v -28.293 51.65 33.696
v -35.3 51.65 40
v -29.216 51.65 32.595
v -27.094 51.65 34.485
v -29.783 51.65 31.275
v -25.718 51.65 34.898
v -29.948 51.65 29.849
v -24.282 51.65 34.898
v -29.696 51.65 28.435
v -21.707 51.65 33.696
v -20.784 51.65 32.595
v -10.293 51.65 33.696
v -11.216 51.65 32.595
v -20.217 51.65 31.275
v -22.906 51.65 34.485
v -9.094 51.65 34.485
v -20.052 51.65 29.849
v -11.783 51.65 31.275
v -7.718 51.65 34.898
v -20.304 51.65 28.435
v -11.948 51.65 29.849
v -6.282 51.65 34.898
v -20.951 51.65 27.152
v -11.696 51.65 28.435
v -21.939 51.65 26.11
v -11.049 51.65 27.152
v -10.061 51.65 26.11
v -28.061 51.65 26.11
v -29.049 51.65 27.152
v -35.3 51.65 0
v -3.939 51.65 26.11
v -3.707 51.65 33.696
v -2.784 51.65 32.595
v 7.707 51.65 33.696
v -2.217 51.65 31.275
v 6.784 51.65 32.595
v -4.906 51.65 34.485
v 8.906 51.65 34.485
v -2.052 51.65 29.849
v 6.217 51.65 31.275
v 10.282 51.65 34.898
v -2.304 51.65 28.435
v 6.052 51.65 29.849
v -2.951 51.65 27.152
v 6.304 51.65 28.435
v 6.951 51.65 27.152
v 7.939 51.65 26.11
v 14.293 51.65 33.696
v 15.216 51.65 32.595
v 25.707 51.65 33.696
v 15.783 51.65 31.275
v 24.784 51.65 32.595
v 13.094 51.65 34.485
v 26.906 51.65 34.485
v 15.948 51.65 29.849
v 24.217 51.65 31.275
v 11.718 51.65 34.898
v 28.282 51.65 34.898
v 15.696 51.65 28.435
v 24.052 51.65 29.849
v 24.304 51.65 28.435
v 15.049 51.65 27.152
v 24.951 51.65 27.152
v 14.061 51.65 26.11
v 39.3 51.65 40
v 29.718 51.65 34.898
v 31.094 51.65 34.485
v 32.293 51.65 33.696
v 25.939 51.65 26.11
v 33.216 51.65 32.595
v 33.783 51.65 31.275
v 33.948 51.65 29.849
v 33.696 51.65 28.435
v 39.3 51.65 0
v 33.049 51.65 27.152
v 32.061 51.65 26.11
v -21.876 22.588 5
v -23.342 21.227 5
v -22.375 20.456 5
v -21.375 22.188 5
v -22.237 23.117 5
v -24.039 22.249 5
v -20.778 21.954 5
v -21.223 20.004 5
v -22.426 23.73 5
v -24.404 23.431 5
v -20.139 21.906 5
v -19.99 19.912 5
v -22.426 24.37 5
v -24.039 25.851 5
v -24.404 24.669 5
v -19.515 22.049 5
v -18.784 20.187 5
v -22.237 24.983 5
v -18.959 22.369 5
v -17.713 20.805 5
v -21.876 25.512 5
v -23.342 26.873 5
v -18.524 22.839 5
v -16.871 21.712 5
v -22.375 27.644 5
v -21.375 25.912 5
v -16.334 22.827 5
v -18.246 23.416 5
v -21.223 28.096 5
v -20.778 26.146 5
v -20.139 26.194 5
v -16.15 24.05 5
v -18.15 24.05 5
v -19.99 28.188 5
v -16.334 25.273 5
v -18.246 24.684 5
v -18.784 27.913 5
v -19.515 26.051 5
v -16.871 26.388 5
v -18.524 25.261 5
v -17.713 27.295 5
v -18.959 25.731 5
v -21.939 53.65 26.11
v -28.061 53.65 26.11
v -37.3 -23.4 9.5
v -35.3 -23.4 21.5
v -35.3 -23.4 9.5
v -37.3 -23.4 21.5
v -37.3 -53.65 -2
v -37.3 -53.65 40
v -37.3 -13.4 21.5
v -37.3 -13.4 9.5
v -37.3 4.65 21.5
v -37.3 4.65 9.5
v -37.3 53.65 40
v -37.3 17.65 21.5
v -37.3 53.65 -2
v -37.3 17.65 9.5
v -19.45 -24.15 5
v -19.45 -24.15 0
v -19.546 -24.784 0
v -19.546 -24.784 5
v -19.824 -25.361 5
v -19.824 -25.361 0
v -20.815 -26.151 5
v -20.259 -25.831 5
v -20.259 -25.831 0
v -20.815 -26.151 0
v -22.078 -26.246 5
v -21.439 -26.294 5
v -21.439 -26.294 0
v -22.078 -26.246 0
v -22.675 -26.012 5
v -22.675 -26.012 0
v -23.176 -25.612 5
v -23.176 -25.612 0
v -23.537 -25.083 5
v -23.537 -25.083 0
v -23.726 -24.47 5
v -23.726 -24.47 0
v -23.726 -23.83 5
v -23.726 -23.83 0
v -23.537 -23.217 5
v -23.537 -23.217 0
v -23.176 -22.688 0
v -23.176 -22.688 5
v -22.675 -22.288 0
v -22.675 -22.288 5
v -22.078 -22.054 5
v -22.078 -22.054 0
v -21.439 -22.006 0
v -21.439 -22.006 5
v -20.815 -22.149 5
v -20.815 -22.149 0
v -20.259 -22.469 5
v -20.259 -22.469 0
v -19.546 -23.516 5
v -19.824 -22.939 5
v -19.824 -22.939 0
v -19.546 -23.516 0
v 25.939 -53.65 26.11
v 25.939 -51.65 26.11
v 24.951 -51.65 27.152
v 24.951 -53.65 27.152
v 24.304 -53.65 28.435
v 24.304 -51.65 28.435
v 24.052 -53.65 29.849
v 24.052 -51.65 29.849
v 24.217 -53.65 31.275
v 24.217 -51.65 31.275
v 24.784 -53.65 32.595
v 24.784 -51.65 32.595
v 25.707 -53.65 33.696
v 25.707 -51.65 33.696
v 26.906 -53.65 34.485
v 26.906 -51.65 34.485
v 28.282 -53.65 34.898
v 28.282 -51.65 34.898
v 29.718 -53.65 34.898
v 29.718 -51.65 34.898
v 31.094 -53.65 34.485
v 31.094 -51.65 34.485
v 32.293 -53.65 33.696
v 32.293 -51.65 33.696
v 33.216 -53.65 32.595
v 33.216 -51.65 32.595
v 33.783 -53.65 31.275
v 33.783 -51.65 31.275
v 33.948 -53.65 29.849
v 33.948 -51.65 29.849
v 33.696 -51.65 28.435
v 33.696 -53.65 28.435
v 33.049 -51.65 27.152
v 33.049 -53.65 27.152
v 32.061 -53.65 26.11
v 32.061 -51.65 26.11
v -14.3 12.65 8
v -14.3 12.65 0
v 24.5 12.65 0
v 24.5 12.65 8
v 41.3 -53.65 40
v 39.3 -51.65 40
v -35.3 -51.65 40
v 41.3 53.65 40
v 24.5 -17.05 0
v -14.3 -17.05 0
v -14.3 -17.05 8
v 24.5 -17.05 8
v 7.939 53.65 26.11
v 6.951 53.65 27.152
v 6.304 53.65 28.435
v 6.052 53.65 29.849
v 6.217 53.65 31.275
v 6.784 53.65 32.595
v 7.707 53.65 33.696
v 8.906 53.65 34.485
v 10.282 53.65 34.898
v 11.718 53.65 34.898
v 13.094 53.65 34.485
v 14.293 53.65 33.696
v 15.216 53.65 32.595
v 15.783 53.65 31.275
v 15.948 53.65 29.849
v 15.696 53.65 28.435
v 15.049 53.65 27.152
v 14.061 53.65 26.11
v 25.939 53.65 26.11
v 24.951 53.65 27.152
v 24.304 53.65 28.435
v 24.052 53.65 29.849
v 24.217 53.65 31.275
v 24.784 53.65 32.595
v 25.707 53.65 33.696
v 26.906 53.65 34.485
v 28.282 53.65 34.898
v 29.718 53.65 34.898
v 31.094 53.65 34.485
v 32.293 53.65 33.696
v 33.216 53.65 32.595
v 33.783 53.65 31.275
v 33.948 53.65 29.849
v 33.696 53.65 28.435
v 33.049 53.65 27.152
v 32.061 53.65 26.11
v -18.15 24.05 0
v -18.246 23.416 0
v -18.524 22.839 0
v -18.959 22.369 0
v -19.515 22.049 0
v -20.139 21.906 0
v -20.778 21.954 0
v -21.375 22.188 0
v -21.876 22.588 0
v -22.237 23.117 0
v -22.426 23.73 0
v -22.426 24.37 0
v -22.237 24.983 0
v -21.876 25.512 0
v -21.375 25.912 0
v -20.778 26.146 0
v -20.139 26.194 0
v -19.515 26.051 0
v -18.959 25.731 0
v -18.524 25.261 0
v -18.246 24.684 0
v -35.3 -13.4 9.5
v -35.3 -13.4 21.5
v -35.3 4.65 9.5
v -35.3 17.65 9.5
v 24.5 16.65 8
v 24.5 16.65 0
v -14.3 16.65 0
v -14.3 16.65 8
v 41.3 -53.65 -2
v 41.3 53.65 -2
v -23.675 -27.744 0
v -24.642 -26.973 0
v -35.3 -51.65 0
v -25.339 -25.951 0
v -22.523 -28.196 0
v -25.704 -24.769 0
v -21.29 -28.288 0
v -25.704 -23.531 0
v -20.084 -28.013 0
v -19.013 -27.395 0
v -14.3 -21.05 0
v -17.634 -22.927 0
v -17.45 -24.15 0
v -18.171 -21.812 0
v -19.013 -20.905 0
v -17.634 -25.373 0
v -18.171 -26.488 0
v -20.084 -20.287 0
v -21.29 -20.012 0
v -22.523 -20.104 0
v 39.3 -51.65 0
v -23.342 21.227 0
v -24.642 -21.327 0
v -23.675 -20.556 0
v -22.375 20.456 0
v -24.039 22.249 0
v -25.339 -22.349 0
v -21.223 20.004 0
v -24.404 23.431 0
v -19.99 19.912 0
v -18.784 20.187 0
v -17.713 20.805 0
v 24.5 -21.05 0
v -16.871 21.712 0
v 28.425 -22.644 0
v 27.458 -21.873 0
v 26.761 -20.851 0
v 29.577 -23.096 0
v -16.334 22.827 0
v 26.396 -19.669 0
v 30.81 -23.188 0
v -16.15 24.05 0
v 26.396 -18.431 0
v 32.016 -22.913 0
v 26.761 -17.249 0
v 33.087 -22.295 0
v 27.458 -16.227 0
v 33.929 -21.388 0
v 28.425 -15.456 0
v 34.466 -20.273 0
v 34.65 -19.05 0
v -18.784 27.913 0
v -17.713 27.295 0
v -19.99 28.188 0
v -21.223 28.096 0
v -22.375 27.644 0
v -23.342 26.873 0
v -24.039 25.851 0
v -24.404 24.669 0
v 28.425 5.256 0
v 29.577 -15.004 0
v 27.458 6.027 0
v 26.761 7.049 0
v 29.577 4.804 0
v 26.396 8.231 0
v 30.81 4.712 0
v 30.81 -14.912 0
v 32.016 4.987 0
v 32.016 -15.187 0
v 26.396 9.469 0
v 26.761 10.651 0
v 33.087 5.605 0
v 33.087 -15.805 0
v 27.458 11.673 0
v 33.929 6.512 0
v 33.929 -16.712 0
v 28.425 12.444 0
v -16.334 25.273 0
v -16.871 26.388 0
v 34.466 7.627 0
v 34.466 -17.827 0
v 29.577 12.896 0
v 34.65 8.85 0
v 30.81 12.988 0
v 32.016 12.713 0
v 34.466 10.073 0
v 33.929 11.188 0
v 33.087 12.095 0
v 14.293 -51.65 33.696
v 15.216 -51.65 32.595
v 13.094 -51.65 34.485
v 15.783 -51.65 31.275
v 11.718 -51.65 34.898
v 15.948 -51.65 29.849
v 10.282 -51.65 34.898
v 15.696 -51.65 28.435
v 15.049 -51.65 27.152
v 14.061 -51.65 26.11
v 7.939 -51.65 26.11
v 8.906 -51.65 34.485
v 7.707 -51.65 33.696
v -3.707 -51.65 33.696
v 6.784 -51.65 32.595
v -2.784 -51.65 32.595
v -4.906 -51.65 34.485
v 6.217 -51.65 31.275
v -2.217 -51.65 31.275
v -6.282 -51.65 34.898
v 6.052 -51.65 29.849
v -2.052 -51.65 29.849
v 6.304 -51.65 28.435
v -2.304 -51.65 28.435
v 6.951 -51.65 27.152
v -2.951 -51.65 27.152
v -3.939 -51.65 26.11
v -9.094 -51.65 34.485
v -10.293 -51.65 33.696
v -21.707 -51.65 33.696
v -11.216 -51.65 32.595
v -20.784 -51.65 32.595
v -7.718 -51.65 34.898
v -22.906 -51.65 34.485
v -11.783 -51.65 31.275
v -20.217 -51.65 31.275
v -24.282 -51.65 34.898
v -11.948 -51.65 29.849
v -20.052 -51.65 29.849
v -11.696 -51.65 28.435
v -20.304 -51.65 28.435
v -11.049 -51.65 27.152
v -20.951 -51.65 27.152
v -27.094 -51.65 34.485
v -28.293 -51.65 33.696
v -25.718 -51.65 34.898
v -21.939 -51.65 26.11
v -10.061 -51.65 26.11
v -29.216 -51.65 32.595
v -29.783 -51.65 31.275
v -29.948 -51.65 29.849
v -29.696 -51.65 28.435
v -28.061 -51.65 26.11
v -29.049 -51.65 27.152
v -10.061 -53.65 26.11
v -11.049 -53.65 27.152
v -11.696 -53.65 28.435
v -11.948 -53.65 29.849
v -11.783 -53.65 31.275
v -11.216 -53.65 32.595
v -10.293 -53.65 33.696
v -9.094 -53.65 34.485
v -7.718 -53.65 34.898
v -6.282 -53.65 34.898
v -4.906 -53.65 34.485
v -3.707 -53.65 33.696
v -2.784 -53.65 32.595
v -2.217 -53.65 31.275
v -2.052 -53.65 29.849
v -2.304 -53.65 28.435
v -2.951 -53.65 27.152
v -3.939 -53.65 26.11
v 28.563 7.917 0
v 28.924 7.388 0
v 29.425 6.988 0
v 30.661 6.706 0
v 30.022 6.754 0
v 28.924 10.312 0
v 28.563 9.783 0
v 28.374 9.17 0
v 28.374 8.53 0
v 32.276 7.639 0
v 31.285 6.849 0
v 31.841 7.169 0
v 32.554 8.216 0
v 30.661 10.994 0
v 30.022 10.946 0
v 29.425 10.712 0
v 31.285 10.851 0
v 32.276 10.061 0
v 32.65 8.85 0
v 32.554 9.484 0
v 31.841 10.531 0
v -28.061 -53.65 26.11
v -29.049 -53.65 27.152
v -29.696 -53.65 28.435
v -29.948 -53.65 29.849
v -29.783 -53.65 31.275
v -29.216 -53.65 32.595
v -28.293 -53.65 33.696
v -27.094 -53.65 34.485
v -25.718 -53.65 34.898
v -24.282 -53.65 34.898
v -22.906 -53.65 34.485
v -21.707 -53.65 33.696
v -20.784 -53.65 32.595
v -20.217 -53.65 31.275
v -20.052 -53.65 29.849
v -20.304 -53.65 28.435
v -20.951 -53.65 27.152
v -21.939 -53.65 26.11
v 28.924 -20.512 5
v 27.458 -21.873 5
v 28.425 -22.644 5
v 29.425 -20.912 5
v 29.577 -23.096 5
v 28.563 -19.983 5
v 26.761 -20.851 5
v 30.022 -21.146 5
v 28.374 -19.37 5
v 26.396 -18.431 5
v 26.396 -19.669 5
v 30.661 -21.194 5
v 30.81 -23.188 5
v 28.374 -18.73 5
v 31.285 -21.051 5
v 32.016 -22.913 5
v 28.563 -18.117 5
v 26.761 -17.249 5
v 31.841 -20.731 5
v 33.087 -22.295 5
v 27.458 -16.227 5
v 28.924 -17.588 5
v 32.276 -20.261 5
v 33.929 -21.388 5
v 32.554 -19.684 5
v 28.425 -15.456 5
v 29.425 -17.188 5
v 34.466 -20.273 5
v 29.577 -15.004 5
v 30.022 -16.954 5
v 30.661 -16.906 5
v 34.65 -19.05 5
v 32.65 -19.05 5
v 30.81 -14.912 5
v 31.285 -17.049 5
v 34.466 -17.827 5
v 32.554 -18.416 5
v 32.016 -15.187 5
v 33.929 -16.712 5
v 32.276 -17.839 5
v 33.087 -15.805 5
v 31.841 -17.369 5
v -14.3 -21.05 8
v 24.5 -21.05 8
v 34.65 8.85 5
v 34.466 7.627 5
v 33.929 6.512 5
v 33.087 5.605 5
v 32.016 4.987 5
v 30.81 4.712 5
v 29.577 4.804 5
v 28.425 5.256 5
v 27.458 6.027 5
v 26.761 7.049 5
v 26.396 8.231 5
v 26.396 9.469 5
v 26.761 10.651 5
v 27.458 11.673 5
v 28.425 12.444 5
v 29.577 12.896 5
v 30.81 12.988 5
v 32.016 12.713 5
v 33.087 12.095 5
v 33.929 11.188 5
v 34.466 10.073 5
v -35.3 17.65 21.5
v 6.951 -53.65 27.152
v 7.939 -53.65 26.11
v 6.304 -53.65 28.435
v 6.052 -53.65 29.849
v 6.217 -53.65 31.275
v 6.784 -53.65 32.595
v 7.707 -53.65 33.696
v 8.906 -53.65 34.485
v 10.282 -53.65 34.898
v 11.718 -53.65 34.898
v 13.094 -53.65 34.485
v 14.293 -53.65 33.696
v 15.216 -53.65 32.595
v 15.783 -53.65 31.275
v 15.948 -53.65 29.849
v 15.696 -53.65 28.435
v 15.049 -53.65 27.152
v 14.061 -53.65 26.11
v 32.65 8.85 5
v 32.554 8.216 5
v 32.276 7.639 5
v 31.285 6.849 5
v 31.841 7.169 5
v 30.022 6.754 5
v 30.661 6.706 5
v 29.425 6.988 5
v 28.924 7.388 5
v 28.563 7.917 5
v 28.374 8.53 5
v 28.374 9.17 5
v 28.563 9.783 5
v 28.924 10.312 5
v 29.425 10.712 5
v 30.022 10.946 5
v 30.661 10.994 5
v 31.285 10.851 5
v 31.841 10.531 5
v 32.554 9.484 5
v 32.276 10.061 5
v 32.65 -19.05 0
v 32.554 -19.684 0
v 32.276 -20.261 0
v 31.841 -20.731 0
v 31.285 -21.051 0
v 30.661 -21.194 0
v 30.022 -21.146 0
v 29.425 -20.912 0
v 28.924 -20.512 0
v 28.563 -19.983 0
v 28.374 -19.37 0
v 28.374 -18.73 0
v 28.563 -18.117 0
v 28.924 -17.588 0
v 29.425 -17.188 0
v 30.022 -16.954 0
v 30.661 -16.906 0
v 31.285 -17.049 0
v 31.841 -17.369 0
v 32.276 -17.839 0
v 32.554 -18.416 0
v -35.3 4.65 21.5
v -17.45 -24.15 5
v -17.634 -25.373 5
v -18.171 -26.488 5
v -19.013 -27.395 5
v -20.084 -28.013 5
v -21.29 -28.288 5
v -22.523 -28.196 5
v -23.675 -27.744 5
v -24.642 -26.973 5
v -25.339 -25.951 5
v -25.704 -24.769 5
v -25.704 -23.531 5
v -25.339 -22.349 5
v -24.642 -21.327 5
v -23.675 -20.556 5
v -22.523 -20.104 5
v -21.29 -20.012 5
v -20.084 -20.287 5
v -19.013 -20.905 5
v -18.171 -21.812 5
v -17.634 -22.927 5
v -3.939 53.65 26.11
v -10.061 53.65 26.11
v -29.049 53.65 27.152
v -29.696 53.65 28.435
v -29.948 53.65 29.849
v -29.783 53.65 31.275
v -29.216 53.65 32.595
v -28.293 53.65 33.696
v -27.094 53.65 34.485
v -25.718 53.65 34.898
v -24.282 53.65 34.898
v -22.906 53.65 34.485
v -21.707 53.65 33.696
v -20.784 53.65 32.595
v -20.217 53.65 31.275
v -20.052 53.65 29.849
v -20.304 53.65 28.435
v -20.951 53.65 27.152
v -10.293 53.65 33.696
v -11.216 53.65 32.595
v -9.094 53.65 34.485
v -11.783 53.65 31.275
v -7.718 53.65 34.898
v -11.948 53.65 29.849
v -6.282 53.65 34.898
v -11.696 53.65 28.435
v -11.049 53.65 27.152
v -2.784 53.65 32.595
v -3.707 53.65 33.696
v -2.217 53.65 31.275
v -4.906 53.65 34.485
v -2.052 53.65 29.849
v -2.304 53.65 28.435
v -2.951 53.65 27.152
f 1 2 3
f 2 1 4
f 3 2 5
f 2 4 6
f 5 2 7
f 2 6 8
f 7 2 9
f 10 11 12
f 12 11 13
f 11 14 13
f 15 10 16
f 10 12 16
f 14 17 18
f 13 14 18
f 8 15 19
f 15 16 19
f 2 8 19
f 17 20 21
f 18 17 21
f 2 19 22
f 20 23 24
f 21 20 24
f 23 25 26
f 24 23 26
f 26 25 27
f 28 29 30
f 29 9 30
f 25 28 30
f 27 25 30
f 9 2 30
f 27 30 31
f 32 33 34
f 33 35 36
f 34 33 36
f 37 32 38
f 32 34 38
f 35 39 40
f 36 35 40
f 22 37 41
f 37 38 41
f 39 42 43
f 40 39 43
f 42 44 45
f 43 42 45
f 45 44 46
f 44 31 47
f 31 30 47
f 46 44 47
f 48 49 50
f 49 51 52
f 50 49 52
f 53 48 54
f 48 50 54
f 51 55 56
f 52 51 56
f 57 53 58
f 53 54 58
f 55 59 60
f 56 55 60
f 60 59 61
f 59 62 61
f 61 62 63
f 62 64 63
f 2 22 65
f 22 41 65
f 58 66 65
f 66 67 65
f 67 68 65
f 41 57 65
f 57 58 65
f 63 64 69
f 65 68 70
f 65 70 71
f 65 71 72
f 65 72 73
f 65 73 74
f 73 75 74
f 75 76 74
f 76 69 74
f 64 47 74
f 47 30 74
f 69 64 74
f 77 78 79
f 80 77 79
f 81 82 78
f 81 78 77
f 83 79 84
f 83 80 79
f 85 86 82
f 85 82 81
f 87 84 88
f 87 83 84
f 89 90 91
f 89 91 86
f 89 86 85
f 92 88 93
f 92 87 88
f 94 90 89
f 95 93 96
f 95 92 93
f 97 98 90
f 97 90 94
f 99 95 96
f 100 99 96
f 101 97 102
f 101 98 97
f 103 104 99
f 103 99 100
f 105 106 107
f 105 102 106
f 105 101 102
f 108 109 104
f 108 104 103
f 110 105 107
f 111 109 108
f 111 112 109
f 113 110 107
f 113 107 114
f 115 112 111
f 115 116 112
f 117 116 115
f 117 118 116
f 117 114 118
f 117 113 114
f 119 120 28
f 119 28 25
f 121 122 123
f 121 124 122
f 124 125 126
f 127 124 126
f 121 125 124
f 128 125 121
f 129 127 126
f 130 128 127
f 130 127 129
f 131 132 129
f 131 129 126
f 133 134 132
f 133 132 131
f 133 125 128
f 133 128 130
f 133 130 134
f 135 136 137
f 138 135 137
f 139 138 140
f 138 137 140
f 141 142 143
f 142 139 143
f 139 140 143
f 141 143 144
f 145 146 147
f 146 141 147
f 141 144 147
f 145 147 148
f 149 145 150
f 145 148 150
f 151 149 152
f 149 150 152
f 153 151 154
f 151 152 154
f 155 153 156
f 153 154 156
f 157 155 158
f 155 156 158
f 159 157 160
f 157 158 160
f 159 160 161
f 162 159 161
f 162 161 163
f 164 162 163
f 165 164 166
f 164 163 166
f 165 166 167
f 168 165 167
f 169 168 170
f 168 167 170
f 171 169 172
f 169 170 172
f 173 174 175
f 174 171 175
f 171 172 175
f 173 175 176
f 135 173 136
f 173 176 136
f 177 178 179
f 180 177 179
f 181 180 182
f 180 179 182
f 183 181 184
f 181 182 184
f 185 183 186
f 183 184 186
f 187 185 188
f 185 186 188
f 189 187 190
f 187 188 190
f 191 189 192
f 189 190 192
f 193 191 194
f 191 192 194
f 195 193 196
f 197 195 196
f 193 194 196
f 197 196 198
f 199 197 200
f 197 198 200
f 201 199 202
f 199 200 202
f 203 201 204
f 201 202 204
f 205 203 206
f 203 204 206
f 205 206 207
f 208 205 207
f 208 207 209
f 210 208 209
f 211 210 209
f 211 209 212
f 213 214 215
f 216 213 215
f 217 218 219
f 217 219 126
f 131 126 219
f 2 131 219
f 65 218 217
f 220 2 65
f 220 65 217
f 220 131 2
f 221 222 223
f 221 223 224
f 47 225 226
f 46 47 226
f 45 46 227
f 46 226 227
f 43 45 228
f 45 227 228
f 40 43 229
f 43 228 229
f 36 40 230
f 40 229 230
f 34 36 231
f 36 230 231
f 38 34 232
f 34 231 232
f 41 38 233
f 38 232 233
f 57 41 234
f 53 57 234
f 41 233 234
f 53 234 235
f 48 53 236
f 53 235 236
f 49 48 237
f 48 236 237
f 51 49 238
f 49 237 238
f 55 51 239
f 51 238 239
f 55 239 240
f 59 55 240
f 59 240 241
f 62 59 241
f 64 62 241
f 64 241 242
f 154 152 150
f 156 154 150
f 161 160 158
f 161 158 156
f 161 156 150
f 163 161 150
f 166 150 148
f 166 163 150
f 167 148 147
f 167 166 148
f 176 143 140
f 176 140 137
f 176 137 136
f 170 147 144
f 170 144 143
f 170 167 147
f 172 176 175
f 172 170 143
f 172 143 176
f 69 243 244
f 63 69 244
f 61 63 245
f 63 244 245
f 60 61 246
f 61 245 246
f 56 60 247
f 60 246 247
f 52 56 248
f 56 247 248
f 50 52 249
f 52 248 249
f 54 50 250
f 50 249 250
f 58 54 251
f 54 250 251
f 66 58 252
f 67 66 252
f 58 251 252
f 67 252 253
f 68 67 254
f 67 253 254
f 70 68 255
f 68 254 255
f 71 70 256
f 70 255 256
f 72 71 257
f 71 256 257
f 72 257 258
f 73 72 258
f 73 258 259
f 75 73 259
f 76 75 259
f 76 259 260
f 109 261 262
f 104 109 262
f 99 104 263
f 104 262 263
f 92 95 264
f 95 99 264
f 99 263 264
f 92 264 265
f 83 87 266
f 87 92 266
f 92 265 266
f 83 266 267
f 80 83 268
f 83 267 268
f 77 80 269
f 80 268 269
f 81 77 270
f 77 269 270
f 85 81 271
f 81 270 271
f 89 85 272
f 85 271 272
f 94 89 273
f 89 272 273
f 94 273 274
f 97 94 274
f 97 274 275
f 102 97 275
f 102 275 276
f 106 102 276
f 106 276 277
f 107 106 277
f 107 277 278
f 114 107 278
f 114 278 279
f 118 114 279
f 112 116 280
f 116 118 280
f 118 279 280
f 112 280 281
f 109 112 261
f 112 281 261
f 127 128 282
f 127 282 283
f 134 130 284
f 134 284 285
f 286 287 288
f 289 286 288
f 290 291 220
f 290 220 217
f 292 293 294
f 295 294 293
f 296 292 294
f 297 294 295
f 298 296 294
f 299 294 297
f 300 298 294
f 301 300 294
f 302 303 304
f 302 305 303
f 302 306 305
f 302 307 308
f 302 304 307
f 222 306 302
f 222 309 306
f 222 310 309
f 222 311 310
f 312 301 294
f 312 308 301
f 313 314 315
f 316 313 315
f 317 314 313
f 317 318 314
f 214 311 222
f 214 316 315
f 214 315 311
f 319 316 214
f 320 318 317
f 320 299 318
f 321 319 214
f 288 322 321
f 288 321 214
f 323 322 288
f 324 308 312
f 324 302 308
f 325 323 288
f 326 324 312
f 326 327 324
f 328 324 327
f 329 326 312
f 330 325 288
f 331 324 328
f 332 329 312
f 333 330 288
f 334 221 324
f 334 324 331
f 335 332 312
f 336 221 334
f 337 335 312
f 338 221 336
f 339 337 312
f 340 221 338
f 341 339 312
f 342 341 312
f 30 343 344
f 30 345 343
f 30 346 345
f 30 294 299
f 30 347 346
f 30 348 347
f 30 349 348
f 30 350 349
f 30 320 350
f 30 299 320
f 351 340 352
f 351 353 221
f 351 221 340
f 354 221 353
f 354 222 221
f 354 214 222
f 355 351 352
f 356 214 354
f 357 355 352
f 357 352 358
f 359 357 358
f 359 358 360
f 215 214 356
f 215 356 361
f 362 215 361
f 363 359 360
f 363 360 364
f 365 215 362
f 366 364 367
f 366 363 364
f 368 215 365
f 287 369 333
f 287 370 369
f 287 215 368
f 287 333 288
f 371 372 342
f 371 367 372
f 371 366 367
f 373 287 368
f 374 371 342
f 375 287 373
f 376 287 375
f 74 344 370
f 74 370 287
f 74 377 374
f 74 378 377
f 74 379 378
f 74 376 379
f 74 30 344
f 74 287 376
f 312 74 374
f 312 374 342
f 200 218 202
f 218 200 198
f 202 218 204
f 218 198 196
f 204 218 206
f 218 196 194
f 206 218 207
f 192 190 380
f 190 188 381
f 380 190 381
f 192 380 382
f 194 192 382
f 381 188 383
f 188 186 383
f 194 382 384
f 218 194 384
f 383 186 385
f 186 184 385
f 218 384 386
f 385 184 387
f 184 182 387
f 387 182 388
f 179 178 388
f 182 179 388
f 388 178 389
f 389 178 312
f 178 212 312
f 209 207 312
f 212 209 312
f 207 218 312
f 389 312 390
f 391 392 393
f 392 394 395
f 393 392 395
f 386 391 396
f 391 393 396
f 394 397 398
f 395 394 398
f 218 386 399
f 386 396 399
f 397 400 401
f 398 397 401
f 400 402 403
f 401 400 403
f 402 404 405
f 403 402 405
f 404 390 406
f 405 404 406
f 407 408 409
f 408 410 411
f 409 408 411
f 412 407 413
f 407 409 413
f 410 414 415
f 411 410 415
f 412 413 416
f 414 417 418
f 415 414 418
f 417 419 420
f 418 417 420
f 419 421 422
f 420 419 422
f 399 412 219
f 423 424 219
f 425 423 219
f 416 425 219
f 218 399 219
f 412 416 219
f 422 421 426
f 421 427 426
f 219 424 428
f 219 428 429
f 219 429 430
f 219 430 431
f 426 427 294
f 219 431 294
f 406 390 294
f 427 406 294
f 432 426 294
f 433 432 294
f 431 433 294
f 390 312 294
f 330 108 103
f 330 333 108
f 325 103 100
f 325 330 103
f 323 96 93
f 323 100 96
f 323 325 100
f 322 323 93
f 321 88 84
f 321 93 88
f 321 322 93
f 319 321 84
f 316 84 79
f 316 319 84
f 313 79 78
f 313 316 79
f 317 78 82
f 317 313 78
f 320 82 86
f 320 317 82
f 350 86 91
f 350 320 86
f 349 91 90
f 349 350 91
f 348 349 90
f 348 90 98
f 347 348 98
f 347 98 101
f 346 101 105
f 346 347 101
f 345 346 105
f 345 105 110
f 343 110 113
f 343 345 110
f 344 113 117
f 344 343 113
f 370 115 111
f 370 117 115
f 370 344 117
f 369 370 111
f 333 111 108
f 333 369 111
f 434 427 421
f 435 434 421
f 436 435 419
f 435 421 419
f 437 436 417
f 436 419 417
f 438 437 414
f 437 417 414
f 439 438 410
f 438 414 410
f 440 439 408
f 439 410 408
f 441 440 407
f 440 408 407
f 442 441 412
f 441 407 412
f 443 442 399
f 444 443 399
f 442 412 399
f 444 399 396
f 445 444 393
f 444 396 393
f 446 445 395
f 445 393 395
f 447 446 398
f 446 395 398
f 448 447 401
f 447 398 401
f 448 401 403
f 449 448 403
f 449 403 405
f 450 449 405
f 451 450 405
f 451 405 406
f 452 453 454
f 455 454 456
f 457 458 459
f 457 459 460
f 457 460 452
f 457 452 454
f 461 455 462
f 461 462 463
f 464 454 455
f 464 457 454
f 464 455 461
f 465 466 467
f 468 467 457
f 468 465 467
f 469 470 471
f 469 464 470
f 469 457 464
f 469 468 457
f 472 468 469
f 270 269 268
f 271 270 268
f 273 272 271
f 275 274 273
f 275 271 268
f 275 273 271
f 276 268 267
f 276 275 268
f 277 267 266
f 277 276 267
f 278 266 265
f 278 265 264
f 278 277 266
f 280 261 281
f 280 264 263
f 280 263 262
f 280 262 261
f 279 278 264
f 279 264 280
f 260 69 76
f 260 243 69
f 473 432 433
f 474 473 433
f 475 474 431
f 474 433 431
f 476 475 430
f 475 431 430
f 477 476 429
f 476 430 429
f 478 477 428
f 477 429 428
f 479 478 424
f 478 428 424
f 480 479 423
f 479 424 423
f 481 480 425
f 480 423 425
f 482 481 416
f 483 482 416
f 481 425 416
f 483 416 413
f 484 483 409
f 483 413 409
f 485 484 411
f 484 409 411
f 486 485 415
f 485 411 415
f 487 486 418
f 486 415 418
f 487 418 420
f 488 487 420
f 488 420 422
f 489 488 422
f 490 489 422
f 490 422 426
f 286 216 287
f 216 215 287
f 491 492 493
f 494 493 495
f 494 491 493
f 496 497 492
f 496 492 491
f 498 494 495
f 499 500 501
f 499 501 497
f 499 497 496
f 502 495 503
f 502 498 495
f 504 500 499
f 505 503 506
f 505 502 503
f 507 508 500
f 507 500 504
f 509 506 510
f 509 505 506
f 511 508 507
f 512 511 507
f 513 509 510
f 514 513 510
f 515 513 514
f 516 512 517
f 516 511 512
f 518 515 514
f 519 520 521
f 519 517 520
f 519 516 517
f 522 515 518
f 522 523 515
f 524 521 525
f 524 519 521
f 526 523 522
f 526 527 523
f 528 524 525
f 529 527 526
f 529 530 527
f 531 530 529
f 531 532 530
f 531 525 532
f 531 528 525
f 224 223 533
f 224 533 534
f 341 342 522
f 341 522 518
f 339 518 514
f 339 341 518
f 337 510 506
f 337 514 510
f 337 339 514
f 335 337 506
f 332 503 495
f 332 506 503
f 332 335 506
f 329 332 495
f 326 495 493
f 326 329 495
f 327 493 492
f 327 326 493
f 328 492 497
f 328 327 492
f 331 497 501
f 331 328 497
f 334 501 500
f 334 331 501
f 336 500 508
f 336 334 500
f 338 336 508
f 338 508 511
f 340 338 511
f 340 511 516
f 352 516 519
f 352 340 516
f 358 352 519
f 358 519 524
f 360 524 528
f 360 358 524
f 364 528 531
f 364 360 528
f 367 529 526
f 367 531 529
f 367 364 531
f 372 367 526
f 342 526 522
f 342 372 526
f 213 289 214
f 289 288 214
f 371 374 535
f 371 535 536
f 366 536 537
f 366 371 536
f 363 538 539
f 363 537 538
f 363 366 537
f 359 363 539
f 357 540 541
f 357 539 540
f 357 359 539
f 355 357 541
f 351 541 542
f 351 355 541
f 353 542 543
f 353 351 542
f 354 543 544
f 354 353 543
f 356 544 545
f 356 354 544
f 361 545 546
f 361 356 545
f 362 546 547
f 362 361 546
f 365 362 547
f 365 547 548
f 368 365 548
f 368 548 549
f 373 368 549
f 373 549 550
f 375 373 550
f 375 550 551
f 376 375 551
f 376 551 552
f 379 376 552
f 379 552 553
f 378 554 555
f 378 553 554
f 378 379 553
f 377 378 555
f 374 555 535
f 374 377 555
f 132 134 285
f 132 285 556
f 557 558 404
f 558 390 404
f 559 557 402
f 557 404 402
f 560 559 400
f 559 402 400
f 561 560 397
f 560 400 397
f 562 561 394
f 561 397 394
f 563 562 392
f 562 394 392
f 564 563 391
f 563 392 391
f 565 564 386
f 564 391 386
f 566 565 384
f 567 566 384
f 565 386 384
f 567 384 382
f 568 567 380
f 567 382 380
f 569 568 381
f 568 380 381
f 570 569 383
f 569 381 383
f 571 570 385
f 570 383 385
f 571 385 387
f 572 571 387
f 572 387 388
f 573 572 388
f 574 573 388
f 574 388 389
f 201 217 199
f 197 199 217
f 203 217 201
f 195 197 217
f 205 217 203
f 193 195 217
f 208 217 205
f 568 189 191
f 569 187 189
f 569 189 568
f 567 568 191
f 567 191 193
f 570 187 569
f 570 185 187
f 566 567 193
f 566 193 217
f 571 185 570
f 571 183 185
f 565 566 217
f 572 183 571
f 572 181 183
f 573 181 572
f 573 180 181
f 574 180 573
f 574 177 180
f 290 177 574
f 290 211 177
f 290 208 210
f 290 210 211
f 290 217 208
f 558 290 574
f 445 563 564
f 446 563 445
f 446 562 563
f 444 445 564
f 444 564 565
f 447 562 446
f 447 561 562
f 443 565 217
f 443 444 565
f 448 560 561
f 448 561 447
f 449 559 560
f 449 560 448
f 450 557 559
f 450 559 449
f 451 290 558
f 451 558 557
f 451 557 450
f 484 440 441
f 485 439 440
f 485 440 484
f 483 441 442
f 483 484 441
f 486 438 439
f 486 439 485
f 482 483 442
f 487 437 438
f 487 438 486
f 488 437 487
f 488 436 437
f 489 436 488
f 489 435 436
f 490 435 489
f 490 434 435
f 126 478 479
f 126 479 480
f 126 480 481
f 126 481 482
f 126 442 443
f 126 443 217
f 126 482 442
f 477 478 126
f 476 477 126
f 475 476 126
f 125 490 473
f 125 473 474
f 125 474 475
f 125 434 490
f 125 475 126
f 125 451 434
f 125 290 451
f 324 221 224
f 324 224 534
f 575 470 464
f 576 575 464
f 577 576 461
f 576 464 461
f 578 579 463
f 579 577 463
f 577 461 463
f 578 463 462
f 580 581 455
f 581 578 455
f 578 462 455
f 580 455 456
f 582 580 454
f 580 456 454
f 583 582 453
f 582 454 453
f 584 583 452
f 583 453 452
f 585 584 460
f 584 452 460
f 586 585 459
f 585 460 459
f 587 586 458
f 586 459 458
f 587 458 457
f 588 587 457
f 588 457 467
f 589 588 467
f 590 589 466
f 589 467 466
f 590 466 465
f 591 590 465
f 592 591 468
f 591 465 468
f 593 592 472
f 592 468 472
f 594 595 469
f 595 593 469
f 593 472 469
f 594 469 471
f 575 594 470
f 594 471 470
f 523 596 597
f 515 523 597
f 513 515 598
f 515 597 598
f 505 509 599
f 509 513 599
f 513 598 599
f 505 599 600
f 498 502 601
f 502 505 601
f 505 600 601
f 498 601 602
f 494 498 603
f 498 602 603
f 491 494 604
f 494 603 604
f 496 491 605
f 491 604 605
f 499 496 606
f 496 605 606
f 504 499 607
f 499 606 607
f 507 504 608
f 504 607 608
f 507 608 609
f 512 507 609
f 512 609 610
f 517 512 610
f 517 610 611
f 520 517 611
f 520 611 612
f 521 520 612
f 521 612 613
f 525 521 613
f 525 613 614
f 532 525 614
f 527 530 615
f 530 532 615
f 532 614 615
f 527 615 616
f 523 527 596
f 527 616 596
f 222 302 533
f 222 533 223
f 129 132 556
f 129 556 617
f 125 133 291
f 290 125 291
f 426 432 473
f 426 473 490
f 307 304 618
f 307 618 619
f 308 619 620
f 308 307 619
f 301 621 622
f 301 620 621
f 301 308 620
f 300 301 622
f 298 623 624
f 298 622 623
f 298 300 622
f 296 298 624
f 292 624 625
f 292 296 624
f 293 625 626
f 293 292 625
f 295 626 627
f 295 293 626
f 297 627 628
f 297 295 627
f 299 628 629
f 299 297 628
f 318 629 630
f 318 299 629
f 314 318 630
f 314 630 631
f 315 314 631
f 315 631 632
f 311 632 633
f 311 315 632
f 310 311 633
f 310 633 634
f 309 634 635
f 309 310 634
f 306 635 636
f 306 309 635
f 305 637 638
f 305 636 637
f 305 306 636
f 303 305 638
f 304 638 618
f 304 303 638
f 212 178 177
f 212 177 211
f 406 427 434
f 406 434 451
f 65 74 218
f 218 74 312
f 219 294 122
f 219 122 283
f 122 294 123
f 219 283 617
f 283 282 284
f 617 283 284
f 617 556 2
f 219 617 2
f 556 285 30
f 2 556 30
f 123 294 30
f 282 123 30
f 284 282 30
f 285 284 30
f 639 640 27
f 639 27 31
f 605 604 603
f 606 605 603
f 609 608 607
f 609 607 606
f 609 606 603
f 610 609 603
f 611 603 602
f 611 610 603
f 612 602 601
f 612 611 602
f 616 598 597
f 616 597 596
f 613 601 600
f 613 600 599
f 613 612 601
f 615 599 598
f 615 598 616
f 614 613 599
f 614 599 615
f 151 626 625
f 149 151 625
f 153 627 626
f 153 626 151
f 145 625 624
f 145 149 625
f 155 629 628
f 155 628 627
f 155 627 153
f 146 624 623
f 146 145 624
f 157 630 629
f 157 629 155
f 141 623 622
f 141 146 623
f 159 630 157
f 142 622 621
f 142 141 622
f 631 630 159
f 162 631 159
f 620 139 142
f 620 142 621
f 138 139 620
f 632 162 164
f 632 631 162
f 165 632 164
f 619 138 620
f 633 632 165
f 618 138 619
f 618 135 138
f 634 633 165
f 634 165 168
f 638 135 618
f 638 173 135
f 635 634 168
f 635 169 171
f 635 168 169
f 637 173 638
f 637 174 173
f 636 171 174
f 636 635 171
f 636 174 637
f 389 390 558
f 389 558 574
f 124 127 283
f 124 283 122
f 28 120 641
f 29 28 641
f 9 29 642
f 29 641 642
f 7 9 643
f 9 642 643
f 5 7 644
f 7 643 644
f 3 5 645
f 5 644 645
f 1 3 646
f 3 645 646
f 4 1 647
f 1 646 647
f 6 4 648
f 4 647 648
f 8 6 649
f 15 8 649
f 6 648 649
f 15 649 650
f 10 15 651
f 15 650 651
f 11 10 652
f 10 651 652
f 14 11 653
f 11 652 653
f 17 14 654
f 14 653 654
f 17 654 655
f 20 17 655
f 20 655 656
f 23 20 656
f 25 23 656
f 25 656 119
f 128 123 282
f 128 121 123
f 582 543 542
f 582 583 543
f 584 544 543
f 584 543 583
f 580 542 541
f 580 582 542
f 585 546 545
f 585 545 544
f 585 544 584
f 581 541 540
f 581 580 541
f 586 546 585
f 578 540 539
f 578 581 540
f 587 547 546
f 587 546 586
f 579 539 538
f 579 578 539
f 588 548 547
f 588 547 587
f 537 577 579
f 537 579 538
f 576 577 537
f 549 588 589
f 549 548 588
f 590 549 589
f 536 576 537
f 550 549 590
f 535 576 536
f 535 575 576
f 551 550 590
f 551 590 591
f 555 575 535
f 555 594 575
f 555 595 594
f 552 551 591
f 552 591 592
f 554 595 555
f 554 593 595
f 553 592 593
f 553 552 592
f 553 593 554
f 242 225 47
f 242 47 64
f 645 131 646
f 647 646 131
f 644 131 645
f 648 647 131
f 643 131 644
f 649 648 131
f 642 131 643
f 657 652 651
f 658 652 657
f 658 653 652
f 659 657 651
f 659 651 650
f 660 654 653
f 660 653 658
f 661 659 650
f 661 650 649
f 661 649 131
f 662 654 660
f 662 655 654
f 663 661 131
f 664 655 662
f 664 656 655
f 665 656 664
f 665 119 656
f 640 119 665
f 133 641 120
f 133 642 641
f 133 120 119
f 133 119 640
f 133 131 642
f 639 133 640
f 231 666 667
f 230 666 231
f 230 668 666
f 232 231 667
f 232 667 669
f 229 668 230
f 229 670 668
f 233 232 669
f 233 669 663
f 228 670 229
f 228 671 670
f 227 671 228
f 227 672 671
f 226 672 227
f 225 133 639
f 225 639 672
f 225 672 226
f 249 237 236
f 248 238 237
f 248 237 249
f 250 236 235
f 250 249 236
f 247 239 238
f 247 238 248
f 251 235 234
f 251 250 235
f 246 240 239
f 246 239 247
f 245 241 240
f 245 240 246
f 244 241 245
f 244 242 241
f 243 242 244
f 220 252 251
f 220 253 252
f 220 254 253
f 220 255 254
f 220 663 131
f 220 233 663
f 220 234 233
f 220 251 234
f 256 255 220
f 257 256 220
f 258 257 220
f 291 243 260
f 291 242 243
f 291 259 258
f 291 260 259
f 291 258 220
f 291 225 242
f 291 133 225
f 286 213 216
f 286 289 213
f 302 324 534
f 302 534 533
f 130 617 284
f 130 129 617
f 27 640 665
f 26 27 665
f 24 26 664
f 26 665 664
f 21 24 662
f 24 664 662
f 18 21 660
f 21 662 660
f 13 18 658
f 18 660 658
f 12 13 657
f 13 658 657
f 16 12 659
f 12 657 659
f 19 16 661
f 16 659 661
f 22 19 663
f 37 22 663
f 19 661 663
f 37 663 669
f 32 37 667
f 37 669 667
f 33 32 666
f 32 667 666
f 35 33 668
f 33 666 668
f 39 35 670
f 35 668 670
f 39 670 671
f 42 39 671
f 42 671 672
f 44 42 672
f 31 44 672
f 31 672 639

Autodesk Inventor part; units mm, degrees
ref_plane "YZ Plane" through (0, 0, 0) normal (1, 0, 0) x (0, 1, 0)
ref_plane "XZ Plane" through (0, 0, 0) normal (0, 1, 0) x (-1, 0, 0)
ref_plane "XY Plane" through (0, 0, 0) normal (0, 0, 1) x (1, 0, 0)
sketch "Sketch1" plane through (0, 0, 0) normal (0, 0, 1) x (1, 0, 0)
  line L0 (-35.3, 51.65) -> (39.3, 51.65)
  line L1 (39.3, 51.65) -> (39.3, -51.65)
  line L2 (39.3, -51.65) -> (-35.3, -51.65)
  line L3 (-35.3, -51.65) -> (-35.3, 51.65)
  line L4 (-35.3, 51.65) -> (39.3, -51.65) construction
  line L5 (39.3, 51.65) -> (-35.3, -51.65) construction
  line L6 (34.3, 26.65) -> (-34.3, 26.65) construction
  line L7 (-34.3, 26.65) -> (-34.3, -26.65) construction
  line L8 (-34.3, -26.65) -> (34.3, -26.65) construction
  line L9 (34.3, -26.65) -> (34.3, 26.65) construction
  line L10 (34.3, 26.65) -> (-34.3, -26.65) construction
  line L11 (-34.3, 26.65) -> (34.3, -26.65) construction
  circle A0 centre (-20.3, 24.05) radius 1.6 construction
  circle A1 centre (-21.6, -24.15) radius 1.6 construction
  circle A2 centre (30.5, 8.85) radius 1.6 construction
  circle A3 centre (30.5, -19.05) radius 1.6 construction
  line L12 (-37.3, 53.65) -> (41.3, 53.65)
  line L13 (41.3, 53.65) -> (41.3, -53.65)
  line L14 (41.3, -53.65) -> (-37.3, -53.65)
  line L15 (-37.3, -53.65) -> (-37.3, 53.65)
  line L16 (-37.3, 53.65) -> (41.3, -53.65) construction
  line L17 (41.3, 53.65) -> (-37.3, -53.65) construction
  line L18 (30.5, 53.65) -> (30.5, -53.65) construction
  point P0 (0, 0)
  dimension "d0" = 53.3
  dimension "d2" = 68.6
  dimension "d3" = 14
  dimension "d4" = 2.5
  dimension "d5" = 50.8
  dimension "d6" = 27.9
  dimension "d7" = 5.1
  dimension "d8" = 3.2
  dimension "d9" = 25
  dimension "d10" = 1
  dimension "d11" = 2
  dimension "d12" = 2
  dimension "d59" = 5
  dimension "d62" = 25
  dimension "d63" = 2
  dimension "d64" = 2
  dimension "d92" = 15.2
  dimension "d94" = 1.3
extrude "Extrusion1" add sketch "Sketch1" against normal blind 2 contours L0 L1 L2 L3 | L12 L13 L14 L15
extrude "Extrusion2" add sketch "Sketch1" along normal blind 40
sketch "Sketch2" plane through (0, 0, 0) normal (0, 0, 1) x (1, 0, 0)
  circle A0 centre (-21.6, -24.15) radius 1.6 construction
  circle A1 centre (-20.3, 24.05) radius 4.15
  circle A2 centre (-21.6, -24.15) radius 4.15
  circle A3 centre (30.5, -19.05) radius 4.15
  circle A4 centre (30.5, 8.85) radius 4.15
  circle A5 centre (-20.3, 24.05) radius 2.15
  circle A6 centre (30.5, 8.85) radius 2.15
  circle A7 centre (-21.6, -24.15) radius 2.15
  circle A8 centre (30.5, -19.05) radius 2.15
  point P0 (0, 0)
  dimension "d17" = 8.3
  dimension "d19" = 4.3
extrude "Extrusion3" add sketch "Sketch2" along normal blind 5
sketch "Sketch6" plane through (-37.3, 53.65, -2) normal (0, 1, 0) x (1, 0, 0)
  line L0 (78.6, -42) -> (78.6, 0) projected
  line L1 (0, 0) -> (78.6, 0) projected
  line L2 (0, 0) -> (0, -42) projected
  line L3 (0, -32) -> (78.6, -32) construction
  arc A0 (9.2389, -28.11) -> (15.3611, -28.11) centre (12.3, -32) ccw
  line L4 (78.6, -42) -> (0, -42) projected
  line L5 (12.3, -32) -> (12.3, -28.11) construction
  line L6 (9.2389, -28.11) -> (15.3611, -28.11)
  arc A1 (27.2389, -28.11) -> (33.3611, -28.11) centre (30.3, -32) ccw
  line L7 (27.2389, -28.11) -> (33.3611, -28.11)
  arc A2 (45.2389, -28.11) -> (51.3611, -28.11) centre (48.3, -32) ccw
  line L8 (45.2389, -28.11) -> (51.3611, -28.11)
  arc A3 (63.2389, -28.11) -> (69.3611, -28.11) centre (66.3, -32) ccw
  line L9 (63.2389, -28.11) -> (69.3611, -28.11)
  point P0 (37.3, -2)
  point P1 (30.3, -28.11)
  point P2 (48.3, -28.11)
  point P3 (66.3, -28.11)
  dimension "d46" = 9.9
  dimension "d54" = 12.3
  dimension "d56" = 32
  dimension "d65" = 3.89
  dimension "d68" = 18
  dimension "d73" = 12.3
extrude "Extrusion6" cut sketch "Sketch6" against normal through all contours L6 A0 | L7 A1 | L8 A2 | L9 A3
sketch "Sketch7" plane through (0, 0, 0) normal (0, 0, 1) x (1, 0, 0)
  circle A0 centre (30.5, -19.05) radius 4.15 projected
  circle A1 centre (30.5, 8.85) radius 4.15 projected
  line L0 (-14.3, -17.05) -> (24.5, -17.05)
  line L1 (24.5, -17.05) -> (24.5, -21.05)
  line L2 (24.5, -21.05) -> (-14.3, -21.05)
  line L3 (-14.3, -21.05) -> (-14.3, -17.05)
  line L4 (-34.3, -26.65) -> (34.3, -26.65) construction
  line L5 (34.3, 26.65) -> (-34.3, 26.65) construction
  line L6 (34.3, -26.65) -> (34.3, 26.65) construction
  line L7 (-34.3, 26.65) -> (-34.3, -26.65) construction
  line L8 (24.5, 16.65) -> (-14.3, 16.65)
  line L9 (-14.3, 16.65) -> (-14.3, 12.65)
  line L10 (-14.3, 12.65) -> (24.5, 12.65)
  line L11 (24.5, 12.65) -> (24.5, 16.65)
  point P0 (0, 0)
  point P1 (24.5, -19.05)
  dimension "d79" = 4
  dimension "d80" = 20
  dimension "d81" = 6
  dimension "d82" = 6
  dimension "d83" = 20
  dimension "d86" = 10
  dimension "d87" = 0
extrude "Extrusion7" add sketch "Sketch7" along normal blind 8 contours L0 L1 L2 L3 | L11 L10 L9 L8
sketch "Sketch4" plane through (-37.3, -53.65, -2) normal (-1, 0, 0) x (0, 0, 1)
  line L0 (11.5, 71.3) -> (23.5, 71.3)
  line L1 (23.5, 71.3) -> (23.5, 58.3)
  line L2 (23.5, 58.3) -> (11.5, 58.3)
  line L3 (11.5, 58.3) -> (11.5, 71.3)
  line L4 (11.5, 71.3) -> (23.5, 58.3) construction
  line L5 (23.5, 71.3) -> (11.5, 58.3) construction
  line L6 (23.5, 30.25) -> (11.5, 30.25)
  line L7 (11.5, 30.25) -> (11.5, 40.25)
  line L8 (11.5, 40.25) -> (23.5, 40.25)
  line L9 (23.5, 40.25) -> (23.5, 30.25)
  line L10 (23.5, 30.25) -> (11.5, 40.25) construction
  line L11 (11.5, 30.25) -> (23.5, 40.25) construction
  line L12 (2, 0) -> (2, 107.3) projected
  line L13 (7, 73.55) -> (7, 81.85) projected
  line L14 (10, 36.6) -> (10, 32.6) projected
  line L15 (0, 107.3) -> (42, 107.3) projected
  line L16 (0, 0) -> (0, 107.3) projected
  line L17 (42, 0) -> (0, 0) projected
  line L18 (42, 107.3) -> (42, 0) projected
  point P0 (2, 53.65)
  point P1 (2, 80.3)
  point P2 (2, 80.3)
  point P3 (2, 80.3)
  point P4 (2, 27)
  point P5 (2, 27)
  point P6 (2, 27)
  point P7 (17.5, 64.8)
  point P8 (17.5, 35.25)
  point P9 (2, 0)
  dimension "d22" = 13
  dimension "d24" = 12
  dimension "d26" = 9
  dimension "d27" = 12
  dimension "d28" = 10
  dimension "d31" = 3.25
  dimension "d88" = 1.5
  dimension "d90" = 1.5
extrude "Extrusion4" cut sketch "Sketch4" against normal up to surface (2 mm away) contours L0 L1 L2 L3 | L6 L7 L8 L9
properties part number "Arduino BNC box 1"
